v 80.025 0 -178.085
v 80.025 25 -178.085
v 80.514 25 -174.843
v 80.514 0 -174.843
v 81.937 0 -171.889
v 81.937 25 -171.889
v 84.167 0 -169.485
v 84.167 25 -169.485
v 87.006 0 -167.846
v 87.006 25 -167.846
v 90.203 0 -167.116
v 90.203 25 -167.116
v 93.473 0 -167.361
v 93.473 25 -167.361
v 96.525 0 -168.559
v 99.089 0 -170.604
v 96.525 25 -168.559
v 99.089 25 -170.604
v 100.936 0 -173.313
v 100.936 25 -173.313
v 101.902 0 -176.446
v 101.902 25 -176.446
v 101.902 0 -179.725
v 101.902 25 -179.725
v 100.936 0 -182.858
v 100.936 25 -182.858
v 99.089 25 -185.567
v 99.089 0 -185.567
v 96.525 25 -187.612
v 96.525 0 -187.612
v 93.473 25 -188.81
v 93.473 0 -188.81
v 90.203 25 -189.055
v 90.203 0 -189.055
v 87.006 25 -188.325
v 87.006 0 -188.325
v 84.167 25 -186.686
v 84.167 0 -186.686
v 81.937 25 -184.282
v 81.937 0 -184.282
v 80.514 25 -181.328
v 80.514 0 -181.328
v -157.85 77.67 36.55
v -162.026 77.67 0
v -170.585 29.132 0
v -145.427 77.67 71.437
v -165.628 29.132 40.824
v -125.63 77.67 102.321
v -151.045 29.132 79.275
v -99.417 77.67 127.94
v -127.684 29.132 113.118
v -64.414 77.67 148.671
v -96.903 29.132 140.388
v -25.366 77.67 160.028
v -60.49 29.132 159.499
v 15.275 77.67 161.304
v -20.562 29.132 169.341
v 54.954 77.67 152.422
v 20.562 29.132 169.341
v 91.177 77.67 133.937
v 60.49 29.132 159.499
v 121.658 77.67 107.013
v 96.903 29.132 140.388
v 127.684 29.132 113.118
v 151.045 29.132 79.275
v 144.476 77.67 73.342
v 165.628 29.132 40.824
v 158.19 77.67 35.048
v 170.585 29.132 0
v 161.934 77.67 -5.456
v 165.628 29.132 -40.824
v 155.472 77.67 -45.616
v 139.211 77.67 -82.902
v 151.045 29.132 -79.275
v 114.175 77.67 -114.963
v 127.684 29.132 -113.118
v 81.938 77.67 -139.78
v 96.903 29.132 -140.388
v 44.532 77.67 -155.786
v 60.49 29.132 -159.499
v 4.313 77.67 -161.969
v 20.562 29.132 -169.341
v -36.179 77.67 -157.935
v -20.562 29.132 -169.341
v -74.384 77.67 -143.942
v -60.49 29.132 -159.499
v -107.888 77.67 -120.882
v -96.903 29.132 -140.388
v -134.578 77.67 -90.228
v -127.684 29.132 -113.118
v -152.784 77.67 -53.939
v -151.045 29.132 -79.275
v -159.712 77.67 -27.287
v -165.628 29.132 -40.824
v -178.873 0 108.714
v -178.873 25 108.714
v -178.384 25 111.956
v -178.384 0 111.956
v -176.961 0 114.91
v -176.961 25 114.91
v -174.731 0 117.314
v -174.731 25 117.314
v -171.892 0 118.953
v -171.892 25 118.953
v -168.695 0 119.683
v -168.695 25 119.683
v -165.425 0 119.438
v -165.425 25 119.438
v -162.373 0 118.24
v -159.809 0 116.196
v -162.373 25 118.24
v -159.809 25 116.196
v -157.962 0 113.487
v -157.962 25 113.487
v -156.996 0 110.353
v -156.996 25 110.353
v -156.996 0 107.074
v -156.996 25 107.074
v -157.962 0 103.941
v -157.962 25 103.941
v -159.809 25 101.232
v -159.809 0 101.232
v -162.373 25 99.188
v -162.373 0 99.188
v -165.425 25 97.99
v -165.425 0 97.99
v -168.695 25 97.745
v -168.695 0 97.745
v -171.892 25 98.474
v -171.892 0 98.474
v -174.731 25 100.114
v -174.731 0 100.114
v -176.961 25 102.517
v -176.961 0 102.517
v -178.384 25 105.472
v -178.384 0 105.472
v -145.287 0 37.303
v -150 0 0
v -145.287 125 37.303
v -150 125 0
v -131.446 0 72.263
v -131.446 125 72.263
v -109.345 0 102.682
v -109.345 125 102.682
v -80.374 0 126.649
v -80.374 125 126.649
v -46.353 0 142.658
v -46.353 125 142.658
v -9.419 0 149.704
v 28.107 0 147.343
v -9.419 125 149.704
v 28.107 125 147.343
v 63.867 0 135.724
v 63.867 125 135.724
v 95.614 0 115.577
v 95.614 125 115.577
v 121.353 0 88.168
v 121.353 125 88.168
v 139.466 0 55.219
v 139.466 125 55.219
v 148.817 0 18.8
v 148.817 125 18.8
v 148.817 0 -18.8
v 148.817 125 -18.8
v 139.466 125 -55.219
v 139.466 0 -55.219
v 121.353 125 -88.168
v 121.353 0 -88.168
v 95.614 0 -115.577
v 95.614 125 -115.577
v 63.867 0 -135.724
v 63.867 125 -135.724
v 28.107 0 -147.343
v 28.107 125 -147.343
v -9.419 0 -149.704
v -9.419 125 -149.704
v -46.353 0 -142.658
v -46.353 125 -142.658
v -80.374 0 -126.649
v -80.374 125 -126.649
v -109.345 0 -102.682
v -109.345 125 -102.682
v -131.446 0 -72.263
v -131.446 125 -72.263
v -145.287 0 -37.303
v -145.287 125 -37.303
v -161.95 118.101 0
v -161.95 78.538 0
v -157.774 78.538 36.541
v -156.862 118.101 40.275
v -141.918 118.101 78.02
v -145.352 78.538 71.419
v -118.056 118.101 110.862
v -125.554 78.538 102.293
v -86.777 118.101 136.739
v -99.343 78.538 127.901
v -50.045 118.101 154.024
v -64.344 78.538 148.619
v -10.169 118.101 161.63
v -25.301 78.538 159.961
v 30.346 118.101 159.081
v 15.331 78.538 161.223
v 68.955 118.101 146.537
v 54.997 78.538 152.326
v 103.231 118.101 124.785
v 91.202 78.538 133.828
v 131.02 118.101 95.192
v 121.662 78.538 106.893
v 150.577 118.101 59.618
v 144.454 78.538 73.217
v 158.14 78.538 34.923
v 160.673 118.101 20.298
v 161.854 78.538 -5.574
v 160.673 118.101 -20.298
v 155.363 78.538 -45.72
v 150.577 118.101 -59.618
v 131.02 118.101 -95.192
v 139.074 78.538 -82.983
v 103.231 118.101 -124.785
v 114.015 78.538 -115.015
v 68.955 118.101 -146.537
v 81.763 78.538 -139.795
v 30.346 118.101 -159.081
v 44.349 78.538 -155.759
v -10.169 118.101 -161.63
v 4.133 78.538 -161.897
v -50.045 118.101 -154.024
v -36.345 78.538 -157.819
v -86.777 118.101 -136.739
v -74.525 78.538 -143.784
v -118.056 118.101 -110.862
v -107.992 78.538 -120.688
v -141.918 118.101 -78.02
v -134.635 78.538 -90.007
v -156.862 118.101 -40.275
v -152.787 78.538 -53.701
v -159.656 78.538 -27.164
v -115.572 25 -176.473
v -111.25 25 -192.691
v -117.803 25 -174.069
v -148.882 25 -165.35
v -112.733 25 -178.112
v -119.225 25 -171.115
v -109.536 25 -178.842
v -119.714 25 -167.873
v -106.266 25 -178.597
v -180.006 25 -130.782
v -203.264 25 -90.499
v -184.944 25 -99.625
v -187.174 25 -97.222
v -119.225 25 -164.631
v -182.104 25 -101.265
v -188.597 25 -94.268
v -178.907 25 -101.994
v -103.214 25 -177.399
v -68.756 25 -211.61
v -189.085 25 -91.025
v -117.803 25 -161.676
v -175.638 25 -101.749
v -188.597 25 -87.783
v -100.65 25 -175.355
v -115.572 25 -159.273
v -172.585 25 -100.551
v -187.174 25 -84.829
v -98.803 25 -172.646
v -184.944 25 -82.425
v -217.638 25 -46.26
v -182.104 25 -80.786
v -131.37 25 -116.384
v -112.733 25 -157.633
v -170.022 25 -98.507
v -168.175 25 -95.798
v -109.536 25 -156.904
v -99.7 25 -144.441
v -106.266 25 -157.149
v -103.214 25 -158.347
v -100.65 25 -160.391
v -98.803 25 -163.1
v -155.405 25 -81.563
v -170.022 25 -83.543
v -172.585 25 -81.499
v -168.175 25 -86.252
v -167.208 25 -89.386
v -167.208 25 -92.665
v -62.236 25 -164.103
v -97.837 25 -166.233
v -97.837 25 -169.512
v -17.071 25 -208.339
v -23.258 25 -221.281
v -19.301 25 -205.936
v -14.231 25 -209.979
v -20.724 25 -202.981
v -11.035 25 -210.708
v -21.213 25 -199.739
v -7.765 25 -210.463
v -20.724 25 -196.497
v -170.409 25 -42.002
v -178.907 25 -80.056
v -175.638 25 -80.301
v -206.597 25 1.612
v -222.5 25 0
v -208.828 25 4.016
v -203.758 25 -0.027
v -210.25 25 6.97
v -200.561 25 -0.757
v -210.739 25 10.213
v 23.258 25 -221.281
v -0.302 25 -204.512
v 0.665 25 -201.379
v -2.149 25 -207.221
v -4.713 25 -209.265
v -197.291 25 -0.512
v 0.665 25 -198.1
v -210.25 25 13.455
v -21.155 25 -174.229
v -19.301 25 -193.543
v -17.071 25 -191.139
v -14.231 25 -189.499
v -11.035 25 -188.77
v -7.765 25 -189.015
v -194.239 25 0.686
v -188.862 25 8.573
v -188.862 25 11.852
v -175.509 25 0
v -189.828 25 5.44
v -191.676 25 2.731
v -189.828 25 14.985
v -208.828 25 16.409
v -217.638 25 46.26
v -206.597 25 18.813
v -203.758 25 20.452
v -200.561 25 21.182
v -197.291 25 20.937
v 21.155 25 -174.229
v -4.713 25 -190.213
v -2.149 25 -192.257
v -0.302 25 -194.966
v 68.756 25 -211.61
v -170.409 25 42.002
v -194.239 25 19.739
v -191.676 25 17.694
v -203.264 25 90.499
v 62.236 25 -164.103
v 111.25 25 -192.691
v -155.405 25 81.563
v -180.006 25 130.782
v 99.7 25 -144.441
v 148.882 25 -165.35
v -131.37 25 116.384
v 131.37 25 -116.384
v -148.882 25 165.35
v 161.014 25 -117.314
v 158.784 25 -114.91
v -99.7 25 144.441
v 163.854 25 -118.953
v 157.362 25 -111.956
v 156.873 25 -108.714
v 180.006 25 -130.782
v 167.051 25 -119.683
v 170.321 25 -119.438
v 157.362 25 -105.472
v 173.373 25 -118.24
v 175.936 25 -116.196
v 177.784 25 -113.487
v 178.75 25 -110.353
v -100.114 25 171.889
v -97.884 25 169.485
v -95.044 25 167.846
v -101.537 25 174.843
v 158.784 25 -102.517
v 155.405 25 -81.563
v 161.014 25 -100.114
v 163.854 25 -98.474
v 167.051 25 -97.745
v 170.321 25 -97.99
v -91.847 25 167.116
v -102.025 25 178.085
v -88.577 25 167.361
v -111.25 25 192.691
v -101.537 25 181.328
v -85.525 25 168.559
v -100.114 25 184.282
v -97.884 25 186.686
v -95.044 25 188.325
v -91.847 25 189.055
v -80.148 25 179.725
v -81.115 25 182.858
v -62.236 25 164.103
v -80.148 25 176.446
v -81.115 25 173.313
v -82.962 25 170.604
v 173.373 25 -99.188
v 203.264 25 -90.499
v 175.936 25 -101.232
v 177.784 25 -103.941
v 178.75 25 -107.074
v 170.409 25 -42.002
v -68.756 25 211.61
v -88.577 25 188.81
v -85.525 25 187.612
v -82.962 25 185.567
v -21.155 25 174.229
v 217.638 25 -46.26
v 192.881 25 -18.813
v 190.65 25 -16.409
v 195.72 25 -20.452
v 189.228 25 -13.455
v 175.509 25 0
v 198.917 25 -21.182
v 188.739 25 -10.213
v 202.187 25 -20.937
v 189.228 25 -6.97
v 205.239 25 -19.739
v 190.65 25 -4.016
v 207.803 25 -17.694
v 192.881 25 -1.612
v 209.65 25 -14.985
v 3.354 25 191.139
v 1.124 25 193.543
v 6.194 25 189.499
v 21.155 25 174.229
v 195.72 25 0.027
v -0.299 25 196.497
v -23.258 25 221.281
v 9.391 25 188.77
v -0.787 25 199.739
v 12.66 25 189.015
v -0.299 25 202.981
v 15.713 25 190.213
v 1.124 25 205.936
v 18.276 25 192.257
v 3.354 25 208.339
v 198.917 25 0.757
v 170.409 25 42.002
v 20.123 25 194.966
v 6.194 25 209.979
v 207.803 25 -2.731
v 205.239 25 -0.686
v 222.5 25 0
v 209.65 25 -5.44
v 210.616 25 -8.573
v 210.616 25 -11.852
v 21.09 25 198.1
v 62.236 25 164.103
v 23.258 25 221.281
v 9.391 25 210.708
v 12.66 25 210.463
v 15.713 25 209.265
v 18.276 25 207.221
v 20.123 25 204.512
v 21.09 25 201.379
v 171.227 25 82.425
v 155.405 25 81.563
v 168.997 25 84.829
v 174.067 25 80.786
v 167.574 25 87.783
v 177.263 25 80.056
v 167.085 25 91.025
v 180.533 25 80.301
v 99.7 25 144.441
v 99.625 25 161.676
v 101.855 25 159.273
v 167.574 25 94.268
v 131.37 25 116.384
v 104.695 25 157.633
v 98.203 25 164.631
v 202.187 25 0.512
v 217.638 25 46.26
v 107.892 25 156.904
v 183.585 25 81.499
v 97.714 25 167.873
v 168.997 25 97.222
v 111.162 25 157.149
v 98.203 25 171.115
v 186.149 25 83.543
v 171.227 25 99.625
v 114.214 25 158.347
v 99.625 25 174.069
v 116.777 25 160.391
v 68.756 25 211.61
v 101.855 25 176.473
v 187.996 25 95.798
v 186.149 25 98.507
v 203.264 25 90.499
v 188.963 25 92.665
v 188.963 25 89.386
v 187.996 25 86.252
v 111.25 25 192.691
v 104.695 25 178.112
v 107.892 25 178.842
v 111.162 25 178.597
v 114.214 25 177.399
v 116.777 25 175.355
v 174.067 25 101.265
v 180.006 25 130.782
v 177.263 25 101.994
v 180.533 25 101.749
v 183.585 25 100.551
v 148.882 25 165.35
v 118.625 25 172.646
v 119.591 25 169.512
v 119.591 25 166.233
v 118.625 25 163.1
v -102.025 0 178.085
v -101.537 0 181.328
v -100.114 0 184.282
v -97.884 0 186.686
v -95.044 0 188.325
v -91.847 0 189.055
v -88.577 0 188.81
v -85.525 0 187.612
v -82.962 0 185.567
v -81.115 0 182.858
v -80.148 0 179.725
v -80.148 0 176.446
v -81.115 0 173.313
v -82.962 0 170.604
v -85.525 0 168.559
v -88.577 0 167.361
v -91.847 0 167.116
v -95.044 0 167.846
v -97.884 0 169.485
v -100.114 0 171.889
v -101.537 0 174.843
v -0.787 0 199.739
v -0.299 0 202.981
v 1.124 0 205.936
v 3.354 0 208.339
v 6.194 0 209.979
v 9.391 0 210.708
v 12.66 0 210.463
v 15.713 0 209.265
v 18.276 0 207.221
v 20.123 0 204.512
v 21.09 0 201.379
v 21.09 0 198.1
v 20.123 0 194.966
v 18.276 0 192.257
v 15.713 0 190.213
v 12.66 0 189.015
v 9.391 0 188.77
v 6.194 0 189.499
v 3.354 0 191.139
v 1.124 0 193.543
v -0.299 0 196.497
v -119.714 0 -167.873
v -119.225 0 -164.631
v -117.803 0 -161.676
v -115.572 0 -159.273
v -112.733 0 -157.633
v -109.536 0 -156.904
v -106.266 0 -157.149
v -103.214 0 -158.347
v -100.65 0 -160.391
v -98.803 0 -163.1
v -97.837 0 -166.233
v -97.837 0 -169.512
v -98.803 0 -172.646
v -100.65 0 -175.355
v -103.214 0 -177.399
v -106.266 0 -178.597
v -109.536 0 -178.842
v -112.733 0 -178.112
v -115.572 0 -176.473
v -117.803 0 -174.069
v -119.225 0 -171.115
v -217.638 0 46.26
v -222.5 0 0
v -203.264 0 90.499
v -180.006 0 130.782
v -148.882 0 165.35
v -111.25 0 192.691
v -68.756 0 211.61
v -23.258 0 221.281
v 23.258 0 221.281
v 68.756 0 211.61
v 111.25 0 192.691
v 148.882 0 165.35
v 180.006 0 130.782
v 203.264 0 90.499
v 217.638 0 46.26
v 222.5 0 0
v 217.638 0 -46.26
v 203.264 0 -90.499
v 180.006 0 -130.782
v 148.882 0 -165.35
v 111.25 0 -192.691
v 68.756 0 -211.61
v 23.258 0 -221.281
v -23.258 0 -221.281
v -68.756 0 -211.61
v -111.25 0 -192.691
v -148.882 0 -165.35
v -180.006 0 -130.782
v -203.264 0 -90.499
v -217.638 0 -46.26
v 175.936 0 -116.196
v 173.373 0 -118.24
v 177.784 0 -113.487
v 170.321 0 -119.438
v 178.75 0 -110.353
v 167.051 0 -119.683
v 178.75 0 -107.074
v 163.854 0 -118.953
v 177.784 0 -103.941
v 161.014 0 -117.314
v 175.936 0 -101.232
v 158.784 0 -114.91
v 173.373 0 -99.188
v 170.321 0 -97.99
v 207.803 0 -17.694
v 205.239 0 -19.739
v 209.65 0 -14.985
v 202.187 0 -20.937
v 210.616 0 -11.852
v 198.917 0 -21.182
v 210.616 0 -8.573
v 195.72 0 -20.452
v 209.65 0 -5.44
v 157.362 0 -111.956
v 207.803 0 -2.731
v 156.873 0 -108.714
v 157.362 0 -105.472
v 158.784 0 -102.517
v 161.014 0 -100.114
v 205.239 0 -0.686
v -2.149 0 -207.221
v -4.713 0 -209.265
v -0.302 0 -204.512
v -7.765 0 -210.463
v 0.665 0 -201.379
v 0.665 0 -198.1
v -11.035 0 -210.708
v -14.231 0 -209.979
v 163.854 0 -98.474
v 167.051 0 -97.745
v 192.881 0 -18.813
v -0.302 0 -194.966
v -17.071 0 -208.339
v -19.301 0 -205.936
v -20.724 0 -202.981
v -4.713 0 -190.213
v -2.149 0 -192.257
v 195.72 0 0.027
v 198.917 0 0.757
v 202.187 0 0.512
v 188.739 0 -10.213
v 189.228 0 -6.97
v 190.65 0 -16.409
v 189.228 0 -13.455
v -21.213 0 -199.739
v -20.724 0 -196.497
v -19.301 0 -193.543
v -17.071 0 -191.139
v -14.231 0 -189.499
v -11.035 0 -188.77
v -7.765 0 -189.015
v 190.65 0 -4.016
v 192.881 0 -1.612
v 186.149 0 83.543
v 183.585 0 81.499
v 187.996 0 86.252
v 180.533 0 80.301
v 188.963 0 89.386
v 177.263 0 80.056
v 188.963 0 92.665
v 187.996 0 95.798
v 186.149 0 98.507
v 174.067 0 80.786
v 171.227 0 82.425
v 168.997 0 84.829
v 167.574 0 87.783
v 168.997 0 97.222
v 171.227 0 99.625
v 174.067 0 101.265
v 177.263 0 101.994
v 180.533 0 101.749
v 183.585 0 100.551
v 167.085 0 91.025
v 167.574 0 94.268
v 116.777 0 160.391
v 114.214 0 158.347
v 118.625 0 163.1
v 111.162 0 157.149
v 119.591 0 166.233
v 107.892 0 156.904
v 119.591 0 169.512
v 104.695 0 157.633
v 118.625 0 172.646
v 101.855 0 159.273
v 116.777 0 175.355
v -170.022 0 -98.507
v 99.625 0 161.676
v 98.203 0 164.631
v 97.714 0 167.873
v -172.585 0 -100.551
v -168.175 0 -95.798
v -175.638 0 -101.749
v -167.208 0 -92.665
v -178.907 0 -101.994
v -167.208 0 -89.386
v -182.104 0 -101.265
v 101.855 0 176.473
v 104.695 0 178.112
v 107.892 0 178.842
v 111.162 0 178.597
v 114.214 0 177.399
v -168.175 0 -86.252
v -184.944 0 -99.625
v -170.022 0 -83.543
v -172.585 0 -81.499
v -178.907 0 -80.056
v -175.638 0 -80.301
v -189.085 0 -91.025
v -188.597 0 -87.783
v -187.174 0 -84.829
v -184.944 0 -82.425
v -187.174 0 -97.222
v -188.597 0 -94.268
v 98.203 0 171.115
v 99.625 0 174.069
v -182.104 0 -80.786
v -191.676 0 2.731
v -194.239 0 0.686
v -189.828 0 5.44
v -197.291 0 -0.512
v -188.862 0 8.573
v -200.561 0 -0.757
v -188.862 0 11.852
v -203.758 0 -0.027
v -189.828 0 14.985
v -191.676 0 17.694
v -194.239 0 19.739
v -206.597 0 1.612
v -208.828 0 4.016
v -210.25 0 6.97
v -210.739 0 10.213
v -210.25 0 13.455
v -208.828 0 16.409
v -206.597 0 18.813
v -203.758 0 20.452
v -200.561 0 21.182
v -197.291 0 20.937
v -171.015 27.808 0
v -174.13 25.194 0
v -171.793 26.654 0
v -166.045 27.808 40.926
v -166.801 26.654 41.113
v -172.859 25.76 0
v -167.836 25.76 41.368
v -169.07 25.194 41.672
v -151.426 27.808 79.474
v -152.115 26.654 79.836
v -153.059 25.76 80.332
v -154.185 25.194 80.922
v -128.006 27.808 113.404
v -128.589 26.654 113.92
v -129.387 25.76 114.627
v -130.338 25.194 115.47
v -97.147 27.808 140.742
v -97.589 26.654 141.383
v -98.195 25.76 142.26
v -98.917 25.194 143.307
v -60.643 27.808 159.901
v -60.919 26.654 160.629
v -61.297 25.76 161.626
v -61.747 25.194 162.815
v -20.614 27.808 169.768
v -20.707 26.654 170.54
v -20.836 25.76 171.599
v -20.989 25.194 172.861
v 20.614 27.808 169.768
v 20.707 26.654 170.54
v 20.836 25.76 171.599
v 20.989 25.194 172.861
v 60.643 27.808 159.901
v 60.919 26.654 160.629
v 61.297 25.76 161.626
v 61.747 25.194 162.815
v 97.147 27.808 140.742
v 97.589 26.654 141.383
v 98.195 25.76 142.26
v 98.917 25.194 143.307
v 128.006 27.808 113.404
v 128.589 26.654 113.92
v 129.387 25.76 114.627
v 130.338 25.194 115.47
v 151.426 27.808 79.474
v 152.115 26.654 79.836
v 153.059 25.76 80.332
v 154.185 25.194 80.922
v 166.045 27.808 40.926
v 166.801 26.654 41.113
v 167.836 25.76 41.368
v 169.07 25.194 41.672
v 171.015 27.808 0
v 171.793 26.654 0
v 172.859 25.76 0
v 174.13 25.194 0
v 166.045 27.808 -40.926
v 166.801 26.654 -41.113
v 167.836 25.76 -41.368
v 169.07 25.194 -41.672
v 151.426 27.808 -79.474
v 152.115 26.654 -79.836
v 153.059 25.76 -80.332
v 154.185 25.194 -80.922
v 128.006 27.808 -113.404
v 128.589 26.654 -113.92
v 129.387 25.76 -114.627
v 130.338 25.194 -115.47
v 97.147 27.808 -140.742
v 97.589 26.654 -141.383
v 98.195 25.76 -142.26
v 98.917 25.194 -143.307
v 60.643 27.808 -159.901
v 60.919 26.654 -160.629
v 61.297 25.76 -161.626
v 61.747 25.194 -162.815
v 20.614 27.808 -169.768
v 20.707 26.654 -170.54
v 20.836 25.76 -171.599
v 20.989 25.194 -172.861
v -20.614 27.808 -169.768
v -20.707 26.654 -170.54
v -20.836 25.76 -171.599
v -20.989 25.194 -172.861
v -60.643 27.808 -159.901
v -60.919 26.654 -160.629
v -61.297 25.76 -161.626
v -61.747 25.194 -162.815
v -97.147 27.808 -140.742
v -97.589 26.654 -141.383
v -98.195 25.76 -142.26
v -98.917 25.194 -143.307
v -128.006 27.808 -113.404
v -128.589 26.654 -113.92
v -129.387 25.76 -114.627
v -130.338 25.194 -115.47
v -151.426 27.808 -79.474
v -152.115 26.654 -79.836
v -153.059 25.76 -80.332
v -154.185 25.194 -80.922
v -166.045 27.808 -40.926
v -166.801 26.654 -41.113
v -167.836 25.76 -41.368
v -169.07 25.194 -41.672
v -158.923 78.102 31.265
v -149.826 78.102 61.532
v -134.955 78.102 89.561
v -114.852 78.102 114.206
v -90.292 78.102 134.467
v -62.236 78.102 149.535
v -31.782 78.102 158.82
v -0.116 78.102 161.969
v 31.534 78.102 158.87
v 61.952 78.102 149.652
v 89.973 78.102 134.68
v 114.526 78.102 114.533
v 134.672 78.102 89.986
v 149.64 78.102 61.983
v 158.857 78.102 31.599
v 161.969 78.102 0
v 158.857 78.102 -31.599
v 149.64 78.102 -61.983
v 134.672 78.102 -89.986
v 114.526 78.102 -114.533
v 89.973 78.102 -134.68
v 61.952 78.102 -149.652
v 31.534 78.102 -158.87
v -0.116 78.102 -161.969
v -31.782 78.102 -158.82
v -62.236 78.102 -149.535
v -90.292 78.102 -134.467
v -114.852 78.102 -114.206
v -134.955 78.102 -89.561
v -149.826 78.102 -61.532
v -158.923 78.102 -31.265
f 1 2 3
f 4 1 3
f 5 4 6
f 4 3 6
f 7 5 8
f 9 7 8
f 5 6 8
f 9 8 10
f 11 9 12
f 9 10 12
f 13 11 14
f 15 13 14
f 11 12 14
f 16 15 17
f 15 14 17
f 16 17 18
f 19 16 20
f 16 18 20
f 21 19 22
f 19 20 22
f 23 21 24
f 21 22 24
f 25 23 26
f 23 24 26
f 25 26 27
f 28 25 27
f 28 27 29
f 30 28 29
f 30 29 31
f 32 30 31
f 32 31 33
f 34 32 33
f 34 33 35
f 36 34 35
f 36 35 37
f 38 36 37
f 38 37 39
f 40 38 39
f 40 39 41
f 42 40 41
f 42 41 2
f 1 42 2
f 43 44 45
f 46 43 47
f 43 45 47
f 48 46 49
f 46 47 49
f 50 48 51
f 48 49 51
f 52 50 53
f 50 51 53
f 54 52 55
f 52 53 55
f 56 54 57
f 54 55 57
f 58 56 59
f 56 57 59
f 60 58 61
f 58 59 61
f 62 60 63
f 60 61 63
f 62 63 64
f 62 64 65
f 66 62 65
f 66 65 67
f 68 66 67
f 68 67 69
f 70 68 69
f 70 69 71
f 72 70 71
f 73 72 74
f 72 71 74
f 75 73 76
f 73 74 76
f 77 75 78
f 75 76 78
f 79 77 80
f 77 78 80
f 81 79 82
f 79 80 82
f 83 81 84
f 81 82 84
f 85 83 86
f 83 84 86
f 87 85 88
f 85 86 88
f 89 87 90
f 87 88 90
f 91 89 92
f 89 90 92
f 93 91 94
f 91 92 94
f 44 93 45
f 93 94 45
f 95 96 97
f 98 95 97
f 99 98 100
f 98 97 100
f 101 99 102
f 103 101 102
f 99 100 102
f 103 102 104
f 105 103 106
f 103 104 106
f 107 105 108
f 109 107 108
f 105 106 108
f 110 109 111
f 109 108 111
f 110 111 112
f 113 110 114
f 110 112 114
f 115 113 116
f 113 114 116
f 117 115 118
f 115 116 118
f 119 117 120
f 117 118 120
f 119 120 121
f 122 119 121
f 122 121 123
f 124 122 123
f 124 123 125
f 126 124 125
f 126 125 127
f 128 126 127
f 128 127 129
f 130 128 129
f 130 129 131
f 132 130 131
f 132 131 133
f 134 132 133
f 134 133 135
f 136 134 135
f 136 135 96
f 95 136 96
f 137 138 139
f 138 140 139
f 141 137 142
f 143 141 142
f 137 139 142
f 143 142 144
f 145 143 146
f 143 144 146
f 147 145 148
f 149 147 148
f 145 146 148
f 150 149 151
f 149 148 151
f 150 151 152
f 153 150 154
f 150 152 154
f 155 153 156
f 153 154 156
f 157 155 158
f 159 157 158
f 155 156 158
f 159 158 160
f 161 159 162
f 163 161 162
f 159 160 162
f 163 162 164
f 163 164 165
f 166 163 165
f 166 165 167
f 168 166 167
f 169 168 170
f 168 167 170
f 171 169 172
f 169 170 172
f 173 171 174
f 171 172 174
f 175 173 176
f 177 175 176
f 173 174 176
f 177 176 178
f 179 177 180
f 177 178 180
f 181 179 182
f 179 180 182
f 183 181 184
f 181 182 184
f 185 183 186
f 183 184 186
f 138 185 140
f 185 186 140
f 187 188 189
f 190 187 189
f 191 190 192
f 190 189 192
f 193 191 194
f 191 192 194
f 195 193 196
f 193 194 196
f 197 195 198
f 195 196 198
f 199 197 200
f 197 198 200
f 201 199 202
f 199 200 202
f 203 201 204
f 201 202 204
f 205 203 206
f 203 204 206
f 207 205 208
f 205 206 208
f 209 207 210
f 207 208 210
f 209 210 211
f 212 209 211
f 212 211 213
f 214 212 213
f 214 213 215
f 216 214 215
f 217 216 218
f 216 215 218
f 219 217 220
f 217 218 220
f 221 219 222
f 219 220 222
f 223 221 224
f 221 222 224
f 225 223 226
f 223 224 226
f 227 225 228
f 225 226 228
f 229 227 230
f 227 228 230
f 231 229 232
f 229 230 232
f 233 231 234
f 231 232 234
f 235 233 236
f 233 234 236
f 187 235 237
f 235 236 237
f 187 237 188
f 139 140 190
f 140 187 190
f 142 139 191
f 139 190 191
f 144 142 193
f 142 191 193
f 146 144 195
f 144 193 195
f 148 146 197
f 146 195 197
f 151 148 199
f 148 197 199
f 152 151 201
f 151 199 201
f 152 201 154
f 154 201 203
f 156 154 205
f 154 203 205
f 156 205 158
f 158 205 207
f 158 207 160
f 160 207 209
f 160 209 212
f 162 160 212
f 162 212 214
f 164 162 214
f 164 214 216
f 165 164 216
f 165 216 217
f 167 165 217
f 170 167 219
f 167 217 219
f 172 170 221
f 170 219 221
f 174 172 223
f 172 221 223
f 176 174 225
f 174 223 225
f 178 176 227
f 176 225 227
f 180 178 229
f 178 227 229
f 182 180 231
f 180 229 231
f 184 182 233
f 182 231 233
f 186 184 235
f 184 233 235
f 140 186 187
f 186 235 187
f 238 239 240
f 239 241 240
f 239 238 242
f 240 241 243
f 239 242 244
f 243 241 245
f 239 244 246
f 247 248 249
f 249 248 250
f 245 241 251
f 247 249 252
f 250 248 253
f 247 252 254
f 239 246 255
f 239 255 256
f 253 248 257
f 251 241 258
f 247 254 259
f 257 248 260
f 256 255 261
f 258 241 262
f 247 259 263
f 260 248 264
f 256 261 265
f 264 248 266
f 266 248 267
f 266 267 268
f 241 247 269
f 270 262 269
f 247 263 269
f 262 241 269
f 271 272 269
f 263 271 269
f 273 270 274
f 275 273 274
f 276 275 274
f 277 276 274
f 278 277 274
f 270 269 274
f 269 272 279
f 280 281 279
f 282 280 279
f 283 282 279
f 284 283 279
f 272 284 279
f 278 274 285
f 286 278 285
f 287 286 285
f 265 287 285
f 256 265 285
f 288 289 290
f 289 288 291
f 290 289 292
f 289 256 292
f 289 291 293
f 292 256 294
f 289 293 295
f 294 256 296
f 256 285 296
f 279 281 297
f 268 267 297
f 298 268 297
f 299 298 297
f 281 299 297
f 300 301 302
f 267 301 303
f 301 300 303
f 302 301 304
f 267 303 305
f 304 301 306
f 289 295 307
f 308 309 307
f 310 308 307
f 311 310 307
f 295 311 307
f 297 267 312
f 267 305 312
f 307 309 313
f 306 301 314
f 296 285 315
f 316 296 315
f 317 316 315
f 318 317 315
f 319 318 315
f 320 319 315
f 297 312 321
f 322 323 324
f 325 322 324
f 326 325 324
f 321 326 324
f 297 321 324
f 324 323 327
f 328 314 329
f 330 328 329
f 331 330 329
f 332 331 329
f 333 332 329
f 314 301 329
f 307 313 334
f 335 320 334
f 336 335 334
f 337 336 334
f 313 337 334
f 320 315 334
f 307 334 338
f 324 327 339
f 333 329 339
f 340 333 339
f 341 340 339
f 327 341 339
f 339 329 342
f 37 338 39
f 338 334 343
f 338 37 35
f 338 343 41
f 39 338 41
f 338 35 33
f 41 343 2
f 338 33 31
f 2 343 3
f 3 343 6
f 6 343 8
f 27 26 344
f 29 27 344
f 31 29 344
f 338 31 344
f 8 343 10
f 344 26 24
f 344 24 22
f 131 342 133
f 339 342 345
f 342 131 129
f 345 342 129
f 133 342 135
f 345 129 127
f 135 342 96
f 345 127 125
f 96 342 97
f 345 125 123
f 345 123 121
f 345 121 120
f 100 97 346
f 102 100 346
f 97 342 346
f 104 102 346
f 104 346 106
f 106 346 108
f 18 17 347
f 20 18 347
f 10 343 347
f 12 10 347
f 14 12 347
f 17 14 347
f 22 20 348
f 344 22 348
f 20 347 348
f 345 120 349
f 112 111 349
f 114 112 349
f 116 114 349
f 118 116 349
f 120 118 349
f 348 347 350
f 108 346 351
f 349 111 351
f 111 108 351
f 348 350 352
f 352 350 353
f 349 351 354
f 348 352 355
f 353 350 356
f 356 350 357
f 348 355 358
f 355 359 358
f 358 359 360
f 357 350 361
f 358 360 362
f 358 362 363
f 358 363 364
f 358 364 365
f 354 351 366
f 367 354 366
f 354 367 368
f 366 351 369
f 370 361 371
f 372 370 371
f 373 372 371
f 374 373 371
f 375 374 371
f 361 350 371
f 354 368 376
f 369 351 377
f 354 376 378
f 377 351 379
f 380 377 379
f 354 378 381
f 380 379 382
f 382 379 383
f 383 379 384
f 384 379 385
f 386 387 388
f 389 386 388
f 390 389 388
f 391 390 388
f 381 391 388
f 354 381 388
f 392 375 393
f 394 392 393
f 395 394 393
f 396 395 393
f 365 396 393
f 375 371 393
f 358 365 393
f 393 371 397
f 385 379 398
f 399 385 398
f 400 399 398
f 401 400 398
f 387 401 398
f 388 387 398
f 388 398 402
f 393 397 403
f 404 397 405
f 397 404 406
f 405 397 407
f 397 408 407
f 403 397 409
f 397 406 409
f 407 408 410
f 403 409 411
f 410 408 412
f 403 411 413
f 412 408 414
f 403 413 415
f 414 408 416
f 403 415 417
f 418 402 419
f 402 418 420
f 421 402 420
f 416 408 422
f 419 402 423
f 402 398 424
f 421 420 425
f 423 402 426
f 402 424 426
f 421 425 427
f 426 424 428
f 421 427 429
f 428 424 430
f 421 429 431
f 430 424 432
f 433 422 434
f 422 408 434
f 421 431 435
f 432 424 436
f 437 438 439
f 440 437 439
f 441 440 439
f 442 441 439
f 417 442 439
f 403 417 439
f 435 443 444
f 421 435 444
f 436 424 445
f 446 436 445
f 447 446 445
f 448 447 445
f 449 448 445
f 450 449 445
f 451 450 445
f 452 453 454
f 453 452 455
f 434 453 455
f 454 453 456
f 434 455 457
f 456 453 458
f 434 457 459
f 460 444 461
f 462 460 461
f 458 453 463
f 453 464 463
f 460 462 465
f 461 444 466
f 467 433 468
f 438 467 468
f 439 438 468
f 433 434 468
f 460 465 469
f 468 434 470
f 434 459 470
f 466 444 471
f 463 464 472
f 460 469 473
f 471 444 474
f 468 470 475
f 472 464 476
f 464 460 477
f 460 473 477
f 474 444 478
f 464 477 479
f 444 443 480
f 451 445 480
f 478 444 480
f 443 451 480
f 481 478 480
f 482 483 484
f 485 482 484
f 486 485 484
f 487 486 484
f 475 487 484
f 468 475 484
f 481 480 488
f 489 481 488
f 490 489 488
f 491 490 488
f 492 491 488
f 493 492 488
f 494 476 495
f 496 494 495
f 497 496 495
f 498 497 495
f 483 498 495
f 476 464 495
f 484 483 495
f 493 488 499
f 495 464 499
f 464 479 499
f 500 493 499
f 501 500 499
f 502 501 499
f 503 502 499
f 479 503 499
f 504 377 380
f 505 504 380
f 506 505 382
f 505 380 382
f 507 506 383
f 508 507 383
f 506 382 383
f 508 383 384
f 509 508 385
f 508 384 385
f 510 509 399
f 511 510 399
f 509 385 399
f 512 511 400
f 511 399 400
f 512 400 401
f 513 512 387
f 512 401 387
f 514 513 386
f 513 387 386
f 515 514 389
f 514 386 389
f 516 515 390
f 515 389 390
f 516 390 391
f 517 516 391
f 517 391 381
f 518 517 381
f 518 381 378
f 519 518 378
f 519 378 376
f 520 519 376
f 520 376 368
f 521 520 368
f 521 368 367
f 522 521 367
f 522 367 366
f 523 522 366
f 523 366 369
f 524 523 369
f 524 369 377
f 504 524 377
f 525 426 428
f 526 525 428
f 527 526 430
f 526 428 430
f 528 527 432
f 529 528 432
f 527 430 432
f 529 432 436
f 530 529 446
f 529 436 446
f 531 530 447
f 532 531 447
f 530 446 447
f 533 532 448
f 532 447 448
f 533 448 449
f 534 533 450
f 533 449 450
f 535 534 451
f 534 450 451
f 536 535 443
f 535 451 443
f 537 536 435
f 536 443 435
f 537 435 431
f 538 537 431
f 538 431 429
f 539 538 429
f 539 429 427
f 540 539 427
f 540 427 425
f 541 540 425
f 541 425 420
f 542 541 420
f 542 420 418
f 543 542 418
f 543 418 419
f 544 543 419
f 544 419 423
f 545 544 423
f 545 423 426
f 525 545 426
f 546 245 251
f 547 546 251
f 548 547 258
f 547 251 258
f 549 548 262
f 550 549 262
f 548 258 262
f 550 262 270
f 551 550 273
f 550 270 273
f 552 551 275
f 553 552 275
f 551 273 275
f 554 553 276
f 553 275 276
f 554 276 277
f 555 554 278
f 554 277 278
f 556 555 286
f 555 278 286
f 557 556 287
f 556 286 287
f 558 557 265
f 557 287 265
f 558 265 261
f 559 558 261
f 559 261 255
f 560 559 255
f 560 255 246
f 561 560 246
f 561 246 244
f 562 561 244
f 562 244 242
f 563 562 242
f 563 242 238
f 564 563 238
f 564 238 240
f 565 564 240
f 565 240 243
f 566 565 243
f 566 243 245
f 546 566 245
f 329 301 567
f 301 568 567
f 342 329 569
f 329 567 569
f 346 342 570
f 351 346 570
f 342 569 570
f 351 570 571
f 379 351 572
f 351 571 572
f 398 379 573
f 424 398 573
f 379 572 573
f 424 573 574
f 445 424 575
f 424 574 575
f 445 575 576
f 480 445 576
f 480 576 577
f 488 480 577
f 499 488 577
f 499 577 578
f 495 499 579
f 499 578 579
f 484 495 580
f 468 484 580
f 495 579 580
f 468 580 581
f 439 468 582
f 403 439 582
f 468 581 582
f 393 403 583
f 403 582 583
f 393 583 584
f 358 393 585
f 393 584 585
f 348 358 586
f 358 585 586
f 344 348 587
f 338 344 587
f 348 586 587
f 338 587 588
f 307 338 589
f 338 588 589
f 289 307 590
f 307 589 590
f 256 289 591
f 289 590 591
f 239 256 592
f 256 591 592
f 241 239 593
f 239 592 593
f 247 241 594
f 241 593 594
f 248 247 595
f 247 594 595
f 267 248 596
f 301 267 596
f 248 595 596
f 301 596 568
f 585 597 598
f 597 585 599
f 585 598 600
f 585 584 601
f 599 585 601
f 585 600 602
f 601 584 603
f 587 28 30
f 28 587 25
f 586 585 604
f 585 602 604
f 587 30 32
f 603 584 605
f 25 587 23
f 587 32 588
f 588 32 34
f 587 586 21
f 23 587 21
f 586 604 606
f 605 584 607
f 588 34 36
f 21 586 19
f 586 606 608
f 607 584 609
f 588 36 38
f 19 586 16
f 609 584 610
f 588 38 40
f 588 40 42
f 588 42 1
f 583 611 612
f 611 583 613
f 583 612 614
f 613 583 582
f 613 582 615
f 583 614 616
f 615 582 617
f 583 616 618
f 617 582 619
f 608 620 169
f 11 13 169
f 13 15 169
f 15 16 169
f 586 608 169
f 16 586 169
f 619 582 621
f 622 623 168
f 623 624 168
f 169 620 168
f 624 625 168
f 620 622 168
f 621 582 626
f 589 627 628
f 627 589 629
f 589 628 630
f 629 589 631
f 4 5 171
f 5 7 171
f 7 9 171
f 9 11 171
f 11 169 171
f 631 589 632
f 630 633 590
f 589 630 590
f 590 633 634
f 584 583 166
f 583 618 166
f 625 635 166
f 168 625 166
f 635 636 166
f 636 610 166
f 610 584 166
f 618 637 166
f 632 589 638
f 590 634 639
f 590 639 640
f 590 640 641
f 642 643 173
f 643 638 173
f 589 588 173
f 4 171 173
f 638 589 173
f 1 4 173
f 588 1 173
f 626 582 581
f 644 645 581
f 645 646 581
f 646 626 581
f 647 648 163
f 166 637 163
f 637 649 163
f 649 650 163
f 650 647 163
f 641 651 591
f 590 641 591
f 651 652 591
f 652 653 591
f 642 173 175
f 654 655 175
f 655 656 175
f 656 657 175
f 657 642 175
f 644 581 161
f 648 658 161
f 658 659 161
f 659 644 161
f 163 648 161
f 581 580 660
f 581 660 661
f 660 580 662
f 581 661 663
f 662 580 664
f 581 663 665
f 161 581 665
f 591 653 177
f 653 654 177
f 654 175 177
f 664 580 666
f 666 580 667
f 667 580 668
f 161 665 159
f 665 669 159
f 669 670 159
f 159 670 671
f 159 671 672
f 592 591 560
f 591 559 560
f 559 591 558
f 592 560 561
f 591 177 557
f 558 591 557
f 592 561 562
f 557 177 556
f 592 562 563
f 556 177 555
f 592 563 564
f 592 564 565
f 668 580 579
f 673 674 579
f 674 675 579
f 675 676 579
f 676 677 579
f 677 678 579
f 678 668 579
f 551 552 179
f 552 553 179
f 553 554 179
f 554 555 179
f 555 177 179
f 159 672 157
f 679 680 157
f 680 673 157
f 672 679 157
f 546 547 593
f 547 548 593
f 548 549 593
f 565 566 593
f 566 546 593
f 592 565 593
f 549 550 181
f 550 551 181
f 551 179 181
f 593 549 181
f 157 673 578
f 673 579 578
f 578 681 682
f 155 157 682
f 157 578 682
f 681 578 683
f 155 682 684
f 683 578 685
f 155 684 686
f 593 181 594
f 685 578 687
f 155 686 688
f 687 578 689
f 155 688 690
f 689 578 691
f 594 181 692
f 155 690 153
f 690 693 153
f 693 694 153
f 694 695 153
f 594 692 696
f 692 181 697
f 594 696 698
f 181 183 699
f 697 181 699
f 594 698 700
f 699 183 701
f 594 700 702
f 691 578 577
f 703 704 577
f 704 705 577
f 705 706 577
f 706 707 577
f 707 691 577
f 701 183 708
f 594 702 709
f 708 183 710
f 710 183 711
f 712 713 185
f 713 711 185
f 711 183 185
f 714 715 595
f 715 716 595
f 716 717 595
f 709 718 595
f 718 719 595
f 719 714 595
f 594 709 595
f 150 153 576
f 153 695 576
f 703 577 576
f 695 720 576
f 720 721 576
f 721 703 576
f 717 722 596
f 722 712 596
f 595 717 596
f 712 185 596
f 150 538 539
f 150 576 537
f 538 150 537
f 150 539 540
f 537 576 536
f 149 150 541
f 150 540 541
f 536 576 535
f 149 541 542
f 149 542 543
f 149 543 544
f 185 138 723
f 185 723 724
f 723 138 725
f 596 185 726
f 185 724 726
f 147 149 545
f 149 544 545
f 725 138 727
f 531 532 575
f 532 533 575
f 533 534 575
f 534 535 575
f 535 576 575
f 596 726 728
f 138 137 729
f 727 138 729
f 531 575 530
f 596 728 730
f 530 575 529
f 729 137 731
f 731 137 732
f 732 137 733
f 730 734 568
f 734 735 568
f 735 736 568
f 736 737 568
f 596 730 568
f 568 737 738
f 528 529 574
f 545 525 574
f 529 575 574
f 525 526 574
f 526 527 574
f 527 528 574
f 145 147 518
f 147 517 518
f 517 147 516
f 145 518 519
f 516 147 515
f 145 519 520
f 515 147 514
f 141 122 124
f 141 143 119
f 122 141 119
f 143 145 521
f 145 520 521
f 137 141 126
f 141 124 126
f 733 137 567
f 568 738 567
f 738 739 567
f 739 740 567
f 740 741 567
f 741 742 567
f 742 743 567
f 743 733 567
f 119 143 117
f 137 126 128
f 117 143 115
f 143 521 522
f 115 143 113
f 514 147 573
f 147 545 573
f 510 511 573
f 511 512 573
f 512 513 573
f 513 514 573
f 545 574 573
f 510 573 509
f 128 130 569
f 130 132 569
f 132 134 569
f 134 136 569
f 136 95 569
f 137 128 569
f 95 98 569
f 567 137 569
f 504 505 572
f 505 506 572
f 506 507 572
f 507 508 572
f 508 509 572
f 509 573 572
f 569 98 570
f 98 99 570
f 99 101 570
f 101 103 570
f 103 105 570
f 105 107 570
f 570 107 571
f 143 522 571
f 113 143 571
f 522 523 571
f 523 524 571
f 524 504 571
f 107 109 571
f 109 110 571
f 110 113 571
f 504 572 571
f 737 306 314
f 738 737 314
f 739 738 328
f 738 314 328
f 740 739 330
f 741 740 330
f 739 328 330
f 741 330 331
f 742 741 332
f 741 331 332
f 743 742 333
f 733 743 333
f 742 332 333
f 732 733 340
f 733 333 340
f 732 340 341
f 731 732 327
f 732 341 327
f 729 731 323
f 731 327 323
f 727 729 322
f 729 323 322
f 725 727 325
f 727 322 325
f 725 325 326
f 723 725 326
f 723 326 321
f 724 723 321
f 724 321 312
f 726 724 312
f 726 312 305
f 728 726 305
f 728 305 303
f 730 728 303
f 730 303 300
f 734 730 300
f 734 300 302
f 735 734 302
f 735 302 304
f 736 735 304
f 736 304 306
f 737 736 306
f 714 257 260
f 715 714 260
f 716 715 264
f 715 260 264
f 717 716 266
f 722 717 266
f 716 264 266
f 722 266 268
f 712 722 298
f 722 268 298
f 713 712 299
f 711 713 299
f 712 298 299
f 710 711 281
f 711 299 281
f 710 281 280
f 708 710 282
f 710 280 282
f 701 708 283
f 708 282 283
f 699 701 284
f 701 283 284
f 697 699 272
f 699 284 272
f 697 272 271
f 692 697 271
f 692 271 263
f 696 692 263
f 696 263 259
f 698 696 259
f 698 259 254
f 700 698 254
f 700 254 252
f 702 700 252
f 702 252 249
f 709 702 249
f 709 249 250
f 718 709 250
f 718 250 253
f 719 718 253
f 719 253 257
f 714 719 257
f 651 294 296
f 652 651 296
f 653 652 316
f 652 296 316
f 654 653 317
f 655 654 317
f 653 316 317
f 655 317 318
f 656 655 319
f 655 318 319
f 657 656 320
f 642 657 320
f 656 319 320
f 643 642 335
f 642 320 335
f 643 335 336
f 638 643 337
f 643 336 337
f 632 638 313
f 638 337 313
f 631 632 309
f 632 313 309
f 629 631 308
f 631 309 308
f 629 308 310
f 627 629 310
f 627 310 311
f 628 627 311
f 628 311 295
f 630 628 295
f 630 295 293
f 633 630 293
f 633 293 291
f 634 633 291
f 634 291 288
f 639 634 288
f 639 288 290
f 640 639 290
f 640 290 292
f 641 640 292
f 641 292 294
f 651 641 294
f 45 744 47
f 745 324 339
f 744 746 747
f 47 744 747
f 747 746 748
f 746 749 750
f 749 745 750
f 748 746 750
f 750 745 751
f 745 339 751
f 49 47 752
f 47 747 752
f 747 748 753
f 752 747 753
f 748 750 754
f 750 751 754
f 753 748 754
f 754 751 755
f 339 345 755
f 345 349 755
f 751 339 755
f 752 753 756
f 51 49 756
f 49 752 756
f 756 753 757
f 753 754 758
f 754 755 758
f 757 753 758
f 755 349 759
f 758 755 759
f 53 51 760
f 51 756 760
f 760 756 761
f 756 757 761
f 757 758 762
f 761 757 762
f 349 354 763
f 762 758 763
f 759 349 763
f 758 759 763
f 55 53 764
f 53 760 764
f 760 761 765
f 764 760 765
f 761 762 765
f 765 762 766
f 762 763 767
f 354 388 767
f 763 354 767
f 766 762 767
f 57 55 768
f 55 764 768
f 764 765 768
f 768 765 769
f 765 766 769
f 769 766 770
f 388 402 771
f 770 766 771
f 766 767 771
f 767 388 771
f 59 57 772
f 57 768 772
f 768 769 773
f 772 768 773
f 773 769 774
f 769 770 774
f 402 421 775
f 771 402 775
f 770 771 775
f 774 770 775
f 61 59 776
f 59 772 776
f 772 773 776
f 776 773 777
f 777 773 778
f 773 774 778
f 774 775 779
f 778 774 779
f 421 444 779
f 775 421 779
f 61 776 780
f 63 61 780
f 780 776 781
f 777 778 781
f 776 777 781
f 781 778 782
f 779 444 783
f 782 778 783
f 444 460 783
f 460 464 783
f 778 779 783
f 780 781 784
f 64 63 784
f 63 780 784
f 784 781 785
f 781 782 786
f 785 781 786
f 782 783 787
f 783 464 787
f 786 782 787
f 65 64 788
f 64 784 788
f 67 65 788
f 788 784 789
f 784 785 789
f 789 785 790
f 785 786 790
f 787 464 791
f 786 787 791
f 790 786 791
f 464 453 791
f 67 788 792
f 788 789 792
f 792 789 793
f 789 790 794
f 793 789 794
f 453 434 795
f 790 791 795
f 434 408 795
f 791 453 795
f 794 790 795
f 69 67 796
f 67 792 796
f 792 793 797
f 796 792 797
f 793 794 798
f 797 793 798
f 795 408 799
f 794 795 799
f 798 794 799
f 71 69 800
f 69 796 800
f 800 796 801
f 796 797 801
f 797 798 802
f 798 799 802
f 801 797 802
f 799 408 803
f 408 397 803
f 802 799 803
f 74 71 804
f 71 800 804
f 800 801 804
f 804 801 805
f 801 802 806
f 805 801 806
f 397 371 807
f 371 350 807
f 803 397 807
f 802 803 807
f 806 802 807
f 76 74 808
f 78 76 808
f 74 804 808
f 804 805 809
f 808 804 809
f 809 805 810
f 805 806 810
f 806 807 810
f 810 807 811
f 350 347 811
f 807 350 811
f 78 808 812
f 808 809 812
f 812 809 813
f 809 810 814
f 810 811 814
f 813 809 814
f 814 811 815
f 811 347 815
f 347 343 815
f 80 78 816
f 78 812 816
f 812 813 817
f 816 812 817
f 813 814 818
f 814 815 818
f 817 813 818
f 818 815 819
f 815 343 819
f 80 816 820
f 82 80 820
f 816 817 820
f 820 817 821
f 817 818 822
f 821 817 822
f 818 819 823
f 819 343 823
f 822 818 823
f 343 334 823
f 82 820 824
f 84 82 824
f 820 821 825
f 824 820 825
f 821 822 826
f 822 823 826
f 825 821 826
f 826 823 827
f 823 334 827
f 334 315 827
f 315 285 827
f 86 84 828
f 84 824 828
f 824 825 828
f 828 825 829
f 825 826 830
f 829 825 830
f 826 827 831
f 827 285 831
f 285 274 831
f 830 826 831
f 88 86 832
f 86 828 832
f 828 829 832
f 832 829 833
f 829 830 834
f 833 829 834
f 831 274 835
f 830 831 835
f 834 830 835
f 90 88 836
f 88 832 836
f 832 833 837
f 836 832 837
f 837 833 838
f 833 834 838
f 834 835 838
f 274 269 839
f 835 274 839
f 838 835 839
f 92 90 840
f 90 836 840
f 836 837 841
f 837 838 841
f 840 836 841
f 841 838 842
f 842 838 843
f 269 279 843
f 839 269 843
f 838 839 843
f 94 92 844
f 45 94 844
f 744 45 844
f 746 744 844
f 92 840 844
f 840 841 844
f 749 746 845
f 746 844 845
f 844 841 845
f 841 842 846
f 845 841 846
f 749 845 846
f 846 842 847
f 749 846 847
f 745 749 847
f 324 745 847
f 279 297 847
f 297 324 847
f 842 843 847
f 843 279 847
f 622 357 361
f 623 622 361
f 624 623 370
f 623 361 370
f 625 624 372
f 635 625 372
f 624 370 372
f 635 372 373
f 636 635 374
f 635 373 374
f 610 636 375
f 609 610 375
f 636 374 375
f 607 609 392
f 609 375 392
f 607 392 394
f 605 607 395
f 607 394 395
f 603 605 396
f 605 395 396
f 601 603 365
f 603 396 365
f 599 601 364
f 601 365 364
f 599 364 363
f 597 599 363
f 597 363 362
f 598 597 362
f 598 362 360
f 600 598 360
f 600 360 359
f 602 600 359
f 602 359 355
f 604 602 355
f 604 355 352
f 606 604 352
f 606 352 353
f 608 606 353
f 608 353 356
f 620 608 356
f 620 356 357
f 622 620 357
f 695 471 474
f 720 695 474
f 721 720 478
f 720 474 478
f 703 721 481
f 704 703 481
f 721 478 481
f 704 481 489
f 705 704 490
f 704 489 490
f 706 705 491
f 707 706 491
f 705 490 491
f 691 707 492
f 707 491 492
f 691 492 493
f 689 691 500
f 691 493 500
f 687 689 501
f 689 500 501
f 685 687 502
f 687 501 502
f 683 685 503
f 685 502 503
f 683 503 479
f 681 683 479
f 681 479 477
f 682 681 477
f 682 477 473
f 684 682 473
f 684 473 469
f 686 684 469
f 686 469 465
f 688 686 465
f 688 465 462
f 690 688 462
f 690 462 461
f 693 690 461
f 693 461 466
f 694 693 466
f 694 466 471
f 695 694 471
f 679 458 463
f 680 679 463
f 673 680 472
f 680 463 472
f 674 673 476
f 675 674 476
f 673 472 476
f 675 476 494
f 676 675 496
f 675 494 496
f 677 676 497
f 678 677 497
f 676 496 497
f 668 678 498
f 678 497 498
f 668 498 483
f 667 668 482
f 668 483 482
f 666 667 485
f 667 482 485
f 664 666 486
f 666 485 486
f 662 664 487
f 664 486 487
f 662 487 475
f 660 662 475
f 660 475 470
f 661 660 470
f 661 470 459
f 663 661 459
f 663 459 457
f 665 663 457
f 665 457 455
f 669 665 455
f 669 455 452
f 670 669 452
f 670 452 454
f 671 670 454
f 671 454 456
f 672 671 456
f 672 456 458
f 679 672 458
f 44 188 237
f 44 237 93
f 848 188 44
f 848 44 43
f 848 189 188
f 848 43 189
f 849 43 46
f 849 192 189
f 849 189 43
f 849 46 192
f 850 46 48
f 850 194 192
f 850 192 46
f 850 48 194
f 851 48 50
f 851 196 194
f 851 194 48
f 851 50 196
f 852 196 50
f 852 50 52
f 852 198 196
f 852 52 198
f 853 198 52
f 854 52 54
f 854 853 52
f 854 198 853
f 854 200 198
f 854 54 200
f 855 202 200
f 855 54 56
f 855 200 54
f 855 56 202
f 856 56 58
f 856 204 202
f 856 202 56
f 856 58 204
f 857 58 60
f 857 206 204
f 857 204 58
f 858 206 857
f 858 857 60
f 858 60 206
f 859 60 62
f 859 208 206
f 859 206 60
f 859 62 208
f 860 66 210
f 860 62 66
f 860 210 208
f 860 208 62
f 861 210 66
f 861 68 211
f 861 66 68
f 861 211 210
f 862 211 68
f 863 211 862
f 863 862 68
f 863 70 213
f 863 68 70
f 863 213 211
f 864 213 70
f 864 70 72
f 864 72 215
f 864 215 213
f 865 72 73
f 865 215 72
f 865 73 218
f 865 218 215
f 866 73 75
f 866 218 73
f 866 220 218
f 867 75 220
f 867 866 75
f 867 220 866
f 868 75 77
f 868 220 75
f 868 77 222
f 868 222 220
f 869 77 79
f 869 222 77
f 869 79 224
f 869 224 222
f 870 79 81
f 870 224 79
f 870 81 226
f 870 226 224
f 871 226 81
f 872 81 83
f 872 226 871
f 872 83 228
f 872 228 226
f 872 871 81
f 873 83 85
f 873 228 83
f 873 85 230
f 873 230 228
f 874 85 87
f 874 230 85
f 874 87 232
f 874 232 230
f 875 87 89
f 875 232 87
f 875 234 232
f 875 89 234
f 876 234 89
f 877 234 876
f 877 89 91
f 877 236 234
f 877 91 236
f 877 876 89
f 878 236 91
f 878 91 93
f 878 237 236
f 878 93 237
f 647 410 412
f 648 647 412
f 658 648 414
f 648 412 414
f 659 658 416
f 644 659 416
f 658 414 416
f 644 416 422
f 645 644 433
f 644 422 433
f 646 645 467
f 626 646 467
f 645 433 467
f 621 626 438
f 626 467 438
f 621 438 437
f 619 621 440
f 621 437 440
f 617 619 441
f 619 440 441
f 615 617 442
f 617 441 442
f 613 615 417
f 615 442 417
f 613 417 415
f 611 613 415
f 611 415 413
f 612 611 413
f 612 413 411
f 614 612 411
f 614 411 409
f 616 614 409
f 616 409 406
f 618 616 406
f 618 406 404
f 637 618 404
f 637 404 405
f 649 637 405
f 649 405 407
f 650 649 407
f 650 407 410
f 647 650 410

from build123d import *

# Parameters (mm, degrees)
F2_R     = 5
F3_R     = 11
F4_DEPTH = 30


with BuildPart() as f1:
    # F0 (on Top) → F1 (revolve)
    with BuildSketch(Plane.XY):
        Polygon((-222.5, 0), (-150, 0), (-150, 125), (-161.95, 118.100664), (-161.95, 78.100664), (-171.31308, 25), (-222.5, 25), align=None)
    revolve(axis=Axis((0, 128.547966, 0), (0, 1, 0)))

    # F2
    f2_edges = [f1.edges().sort_by_distance(p)[0] for p in [
        (171.31308, 25, 0),
        (161.95, 78.100664, 0),
    ]]
    fillet(f2_edges, radius=F2_R)

    # F3 (on face) → F4 (cut)
    with BuildSketch(Plane(origin=(0, 25, 0), x_dir=(-1, 0, 0), z_dir=(0, 1, 0))):
        with Locations((108.713881, -167.872845)):
            Circle(F3_R)
        with Locations((178.085405, -91.025207)):
            Circle(F3_R)
        with Locations((199.739089, 10.212561)):
            Circle(F3_R)
        with Locations((167.872845, 108.713881)):
            Circle(F3_R)
        with Locations((91.025207, 178.085405)):
            Circle(F3_R)
        with Locations((-10.212561, 199.739089)):
            Circle(F3_R)
        with Locations((-108.713881, 167.872845)):
            Circle(F3_R)
        with Locations((-178.085405, 91.025207)):
            Circle(F3_R)
        with Locations((-199.739089, -10.212561)):
            Circle(F3_R)
        with Locations((-167.872845, -108.713881)):
            Circle(F3_R)
        with Locations((-91.025207, -178.085405)):
            Circle(F3_R)
        with Locations((10.212561, -199.739089)):
            Circle(F3_R)
    extrude(amount=-F4_DEPTH, mode=Mode.SUBTRACT)


solid = f1.part
